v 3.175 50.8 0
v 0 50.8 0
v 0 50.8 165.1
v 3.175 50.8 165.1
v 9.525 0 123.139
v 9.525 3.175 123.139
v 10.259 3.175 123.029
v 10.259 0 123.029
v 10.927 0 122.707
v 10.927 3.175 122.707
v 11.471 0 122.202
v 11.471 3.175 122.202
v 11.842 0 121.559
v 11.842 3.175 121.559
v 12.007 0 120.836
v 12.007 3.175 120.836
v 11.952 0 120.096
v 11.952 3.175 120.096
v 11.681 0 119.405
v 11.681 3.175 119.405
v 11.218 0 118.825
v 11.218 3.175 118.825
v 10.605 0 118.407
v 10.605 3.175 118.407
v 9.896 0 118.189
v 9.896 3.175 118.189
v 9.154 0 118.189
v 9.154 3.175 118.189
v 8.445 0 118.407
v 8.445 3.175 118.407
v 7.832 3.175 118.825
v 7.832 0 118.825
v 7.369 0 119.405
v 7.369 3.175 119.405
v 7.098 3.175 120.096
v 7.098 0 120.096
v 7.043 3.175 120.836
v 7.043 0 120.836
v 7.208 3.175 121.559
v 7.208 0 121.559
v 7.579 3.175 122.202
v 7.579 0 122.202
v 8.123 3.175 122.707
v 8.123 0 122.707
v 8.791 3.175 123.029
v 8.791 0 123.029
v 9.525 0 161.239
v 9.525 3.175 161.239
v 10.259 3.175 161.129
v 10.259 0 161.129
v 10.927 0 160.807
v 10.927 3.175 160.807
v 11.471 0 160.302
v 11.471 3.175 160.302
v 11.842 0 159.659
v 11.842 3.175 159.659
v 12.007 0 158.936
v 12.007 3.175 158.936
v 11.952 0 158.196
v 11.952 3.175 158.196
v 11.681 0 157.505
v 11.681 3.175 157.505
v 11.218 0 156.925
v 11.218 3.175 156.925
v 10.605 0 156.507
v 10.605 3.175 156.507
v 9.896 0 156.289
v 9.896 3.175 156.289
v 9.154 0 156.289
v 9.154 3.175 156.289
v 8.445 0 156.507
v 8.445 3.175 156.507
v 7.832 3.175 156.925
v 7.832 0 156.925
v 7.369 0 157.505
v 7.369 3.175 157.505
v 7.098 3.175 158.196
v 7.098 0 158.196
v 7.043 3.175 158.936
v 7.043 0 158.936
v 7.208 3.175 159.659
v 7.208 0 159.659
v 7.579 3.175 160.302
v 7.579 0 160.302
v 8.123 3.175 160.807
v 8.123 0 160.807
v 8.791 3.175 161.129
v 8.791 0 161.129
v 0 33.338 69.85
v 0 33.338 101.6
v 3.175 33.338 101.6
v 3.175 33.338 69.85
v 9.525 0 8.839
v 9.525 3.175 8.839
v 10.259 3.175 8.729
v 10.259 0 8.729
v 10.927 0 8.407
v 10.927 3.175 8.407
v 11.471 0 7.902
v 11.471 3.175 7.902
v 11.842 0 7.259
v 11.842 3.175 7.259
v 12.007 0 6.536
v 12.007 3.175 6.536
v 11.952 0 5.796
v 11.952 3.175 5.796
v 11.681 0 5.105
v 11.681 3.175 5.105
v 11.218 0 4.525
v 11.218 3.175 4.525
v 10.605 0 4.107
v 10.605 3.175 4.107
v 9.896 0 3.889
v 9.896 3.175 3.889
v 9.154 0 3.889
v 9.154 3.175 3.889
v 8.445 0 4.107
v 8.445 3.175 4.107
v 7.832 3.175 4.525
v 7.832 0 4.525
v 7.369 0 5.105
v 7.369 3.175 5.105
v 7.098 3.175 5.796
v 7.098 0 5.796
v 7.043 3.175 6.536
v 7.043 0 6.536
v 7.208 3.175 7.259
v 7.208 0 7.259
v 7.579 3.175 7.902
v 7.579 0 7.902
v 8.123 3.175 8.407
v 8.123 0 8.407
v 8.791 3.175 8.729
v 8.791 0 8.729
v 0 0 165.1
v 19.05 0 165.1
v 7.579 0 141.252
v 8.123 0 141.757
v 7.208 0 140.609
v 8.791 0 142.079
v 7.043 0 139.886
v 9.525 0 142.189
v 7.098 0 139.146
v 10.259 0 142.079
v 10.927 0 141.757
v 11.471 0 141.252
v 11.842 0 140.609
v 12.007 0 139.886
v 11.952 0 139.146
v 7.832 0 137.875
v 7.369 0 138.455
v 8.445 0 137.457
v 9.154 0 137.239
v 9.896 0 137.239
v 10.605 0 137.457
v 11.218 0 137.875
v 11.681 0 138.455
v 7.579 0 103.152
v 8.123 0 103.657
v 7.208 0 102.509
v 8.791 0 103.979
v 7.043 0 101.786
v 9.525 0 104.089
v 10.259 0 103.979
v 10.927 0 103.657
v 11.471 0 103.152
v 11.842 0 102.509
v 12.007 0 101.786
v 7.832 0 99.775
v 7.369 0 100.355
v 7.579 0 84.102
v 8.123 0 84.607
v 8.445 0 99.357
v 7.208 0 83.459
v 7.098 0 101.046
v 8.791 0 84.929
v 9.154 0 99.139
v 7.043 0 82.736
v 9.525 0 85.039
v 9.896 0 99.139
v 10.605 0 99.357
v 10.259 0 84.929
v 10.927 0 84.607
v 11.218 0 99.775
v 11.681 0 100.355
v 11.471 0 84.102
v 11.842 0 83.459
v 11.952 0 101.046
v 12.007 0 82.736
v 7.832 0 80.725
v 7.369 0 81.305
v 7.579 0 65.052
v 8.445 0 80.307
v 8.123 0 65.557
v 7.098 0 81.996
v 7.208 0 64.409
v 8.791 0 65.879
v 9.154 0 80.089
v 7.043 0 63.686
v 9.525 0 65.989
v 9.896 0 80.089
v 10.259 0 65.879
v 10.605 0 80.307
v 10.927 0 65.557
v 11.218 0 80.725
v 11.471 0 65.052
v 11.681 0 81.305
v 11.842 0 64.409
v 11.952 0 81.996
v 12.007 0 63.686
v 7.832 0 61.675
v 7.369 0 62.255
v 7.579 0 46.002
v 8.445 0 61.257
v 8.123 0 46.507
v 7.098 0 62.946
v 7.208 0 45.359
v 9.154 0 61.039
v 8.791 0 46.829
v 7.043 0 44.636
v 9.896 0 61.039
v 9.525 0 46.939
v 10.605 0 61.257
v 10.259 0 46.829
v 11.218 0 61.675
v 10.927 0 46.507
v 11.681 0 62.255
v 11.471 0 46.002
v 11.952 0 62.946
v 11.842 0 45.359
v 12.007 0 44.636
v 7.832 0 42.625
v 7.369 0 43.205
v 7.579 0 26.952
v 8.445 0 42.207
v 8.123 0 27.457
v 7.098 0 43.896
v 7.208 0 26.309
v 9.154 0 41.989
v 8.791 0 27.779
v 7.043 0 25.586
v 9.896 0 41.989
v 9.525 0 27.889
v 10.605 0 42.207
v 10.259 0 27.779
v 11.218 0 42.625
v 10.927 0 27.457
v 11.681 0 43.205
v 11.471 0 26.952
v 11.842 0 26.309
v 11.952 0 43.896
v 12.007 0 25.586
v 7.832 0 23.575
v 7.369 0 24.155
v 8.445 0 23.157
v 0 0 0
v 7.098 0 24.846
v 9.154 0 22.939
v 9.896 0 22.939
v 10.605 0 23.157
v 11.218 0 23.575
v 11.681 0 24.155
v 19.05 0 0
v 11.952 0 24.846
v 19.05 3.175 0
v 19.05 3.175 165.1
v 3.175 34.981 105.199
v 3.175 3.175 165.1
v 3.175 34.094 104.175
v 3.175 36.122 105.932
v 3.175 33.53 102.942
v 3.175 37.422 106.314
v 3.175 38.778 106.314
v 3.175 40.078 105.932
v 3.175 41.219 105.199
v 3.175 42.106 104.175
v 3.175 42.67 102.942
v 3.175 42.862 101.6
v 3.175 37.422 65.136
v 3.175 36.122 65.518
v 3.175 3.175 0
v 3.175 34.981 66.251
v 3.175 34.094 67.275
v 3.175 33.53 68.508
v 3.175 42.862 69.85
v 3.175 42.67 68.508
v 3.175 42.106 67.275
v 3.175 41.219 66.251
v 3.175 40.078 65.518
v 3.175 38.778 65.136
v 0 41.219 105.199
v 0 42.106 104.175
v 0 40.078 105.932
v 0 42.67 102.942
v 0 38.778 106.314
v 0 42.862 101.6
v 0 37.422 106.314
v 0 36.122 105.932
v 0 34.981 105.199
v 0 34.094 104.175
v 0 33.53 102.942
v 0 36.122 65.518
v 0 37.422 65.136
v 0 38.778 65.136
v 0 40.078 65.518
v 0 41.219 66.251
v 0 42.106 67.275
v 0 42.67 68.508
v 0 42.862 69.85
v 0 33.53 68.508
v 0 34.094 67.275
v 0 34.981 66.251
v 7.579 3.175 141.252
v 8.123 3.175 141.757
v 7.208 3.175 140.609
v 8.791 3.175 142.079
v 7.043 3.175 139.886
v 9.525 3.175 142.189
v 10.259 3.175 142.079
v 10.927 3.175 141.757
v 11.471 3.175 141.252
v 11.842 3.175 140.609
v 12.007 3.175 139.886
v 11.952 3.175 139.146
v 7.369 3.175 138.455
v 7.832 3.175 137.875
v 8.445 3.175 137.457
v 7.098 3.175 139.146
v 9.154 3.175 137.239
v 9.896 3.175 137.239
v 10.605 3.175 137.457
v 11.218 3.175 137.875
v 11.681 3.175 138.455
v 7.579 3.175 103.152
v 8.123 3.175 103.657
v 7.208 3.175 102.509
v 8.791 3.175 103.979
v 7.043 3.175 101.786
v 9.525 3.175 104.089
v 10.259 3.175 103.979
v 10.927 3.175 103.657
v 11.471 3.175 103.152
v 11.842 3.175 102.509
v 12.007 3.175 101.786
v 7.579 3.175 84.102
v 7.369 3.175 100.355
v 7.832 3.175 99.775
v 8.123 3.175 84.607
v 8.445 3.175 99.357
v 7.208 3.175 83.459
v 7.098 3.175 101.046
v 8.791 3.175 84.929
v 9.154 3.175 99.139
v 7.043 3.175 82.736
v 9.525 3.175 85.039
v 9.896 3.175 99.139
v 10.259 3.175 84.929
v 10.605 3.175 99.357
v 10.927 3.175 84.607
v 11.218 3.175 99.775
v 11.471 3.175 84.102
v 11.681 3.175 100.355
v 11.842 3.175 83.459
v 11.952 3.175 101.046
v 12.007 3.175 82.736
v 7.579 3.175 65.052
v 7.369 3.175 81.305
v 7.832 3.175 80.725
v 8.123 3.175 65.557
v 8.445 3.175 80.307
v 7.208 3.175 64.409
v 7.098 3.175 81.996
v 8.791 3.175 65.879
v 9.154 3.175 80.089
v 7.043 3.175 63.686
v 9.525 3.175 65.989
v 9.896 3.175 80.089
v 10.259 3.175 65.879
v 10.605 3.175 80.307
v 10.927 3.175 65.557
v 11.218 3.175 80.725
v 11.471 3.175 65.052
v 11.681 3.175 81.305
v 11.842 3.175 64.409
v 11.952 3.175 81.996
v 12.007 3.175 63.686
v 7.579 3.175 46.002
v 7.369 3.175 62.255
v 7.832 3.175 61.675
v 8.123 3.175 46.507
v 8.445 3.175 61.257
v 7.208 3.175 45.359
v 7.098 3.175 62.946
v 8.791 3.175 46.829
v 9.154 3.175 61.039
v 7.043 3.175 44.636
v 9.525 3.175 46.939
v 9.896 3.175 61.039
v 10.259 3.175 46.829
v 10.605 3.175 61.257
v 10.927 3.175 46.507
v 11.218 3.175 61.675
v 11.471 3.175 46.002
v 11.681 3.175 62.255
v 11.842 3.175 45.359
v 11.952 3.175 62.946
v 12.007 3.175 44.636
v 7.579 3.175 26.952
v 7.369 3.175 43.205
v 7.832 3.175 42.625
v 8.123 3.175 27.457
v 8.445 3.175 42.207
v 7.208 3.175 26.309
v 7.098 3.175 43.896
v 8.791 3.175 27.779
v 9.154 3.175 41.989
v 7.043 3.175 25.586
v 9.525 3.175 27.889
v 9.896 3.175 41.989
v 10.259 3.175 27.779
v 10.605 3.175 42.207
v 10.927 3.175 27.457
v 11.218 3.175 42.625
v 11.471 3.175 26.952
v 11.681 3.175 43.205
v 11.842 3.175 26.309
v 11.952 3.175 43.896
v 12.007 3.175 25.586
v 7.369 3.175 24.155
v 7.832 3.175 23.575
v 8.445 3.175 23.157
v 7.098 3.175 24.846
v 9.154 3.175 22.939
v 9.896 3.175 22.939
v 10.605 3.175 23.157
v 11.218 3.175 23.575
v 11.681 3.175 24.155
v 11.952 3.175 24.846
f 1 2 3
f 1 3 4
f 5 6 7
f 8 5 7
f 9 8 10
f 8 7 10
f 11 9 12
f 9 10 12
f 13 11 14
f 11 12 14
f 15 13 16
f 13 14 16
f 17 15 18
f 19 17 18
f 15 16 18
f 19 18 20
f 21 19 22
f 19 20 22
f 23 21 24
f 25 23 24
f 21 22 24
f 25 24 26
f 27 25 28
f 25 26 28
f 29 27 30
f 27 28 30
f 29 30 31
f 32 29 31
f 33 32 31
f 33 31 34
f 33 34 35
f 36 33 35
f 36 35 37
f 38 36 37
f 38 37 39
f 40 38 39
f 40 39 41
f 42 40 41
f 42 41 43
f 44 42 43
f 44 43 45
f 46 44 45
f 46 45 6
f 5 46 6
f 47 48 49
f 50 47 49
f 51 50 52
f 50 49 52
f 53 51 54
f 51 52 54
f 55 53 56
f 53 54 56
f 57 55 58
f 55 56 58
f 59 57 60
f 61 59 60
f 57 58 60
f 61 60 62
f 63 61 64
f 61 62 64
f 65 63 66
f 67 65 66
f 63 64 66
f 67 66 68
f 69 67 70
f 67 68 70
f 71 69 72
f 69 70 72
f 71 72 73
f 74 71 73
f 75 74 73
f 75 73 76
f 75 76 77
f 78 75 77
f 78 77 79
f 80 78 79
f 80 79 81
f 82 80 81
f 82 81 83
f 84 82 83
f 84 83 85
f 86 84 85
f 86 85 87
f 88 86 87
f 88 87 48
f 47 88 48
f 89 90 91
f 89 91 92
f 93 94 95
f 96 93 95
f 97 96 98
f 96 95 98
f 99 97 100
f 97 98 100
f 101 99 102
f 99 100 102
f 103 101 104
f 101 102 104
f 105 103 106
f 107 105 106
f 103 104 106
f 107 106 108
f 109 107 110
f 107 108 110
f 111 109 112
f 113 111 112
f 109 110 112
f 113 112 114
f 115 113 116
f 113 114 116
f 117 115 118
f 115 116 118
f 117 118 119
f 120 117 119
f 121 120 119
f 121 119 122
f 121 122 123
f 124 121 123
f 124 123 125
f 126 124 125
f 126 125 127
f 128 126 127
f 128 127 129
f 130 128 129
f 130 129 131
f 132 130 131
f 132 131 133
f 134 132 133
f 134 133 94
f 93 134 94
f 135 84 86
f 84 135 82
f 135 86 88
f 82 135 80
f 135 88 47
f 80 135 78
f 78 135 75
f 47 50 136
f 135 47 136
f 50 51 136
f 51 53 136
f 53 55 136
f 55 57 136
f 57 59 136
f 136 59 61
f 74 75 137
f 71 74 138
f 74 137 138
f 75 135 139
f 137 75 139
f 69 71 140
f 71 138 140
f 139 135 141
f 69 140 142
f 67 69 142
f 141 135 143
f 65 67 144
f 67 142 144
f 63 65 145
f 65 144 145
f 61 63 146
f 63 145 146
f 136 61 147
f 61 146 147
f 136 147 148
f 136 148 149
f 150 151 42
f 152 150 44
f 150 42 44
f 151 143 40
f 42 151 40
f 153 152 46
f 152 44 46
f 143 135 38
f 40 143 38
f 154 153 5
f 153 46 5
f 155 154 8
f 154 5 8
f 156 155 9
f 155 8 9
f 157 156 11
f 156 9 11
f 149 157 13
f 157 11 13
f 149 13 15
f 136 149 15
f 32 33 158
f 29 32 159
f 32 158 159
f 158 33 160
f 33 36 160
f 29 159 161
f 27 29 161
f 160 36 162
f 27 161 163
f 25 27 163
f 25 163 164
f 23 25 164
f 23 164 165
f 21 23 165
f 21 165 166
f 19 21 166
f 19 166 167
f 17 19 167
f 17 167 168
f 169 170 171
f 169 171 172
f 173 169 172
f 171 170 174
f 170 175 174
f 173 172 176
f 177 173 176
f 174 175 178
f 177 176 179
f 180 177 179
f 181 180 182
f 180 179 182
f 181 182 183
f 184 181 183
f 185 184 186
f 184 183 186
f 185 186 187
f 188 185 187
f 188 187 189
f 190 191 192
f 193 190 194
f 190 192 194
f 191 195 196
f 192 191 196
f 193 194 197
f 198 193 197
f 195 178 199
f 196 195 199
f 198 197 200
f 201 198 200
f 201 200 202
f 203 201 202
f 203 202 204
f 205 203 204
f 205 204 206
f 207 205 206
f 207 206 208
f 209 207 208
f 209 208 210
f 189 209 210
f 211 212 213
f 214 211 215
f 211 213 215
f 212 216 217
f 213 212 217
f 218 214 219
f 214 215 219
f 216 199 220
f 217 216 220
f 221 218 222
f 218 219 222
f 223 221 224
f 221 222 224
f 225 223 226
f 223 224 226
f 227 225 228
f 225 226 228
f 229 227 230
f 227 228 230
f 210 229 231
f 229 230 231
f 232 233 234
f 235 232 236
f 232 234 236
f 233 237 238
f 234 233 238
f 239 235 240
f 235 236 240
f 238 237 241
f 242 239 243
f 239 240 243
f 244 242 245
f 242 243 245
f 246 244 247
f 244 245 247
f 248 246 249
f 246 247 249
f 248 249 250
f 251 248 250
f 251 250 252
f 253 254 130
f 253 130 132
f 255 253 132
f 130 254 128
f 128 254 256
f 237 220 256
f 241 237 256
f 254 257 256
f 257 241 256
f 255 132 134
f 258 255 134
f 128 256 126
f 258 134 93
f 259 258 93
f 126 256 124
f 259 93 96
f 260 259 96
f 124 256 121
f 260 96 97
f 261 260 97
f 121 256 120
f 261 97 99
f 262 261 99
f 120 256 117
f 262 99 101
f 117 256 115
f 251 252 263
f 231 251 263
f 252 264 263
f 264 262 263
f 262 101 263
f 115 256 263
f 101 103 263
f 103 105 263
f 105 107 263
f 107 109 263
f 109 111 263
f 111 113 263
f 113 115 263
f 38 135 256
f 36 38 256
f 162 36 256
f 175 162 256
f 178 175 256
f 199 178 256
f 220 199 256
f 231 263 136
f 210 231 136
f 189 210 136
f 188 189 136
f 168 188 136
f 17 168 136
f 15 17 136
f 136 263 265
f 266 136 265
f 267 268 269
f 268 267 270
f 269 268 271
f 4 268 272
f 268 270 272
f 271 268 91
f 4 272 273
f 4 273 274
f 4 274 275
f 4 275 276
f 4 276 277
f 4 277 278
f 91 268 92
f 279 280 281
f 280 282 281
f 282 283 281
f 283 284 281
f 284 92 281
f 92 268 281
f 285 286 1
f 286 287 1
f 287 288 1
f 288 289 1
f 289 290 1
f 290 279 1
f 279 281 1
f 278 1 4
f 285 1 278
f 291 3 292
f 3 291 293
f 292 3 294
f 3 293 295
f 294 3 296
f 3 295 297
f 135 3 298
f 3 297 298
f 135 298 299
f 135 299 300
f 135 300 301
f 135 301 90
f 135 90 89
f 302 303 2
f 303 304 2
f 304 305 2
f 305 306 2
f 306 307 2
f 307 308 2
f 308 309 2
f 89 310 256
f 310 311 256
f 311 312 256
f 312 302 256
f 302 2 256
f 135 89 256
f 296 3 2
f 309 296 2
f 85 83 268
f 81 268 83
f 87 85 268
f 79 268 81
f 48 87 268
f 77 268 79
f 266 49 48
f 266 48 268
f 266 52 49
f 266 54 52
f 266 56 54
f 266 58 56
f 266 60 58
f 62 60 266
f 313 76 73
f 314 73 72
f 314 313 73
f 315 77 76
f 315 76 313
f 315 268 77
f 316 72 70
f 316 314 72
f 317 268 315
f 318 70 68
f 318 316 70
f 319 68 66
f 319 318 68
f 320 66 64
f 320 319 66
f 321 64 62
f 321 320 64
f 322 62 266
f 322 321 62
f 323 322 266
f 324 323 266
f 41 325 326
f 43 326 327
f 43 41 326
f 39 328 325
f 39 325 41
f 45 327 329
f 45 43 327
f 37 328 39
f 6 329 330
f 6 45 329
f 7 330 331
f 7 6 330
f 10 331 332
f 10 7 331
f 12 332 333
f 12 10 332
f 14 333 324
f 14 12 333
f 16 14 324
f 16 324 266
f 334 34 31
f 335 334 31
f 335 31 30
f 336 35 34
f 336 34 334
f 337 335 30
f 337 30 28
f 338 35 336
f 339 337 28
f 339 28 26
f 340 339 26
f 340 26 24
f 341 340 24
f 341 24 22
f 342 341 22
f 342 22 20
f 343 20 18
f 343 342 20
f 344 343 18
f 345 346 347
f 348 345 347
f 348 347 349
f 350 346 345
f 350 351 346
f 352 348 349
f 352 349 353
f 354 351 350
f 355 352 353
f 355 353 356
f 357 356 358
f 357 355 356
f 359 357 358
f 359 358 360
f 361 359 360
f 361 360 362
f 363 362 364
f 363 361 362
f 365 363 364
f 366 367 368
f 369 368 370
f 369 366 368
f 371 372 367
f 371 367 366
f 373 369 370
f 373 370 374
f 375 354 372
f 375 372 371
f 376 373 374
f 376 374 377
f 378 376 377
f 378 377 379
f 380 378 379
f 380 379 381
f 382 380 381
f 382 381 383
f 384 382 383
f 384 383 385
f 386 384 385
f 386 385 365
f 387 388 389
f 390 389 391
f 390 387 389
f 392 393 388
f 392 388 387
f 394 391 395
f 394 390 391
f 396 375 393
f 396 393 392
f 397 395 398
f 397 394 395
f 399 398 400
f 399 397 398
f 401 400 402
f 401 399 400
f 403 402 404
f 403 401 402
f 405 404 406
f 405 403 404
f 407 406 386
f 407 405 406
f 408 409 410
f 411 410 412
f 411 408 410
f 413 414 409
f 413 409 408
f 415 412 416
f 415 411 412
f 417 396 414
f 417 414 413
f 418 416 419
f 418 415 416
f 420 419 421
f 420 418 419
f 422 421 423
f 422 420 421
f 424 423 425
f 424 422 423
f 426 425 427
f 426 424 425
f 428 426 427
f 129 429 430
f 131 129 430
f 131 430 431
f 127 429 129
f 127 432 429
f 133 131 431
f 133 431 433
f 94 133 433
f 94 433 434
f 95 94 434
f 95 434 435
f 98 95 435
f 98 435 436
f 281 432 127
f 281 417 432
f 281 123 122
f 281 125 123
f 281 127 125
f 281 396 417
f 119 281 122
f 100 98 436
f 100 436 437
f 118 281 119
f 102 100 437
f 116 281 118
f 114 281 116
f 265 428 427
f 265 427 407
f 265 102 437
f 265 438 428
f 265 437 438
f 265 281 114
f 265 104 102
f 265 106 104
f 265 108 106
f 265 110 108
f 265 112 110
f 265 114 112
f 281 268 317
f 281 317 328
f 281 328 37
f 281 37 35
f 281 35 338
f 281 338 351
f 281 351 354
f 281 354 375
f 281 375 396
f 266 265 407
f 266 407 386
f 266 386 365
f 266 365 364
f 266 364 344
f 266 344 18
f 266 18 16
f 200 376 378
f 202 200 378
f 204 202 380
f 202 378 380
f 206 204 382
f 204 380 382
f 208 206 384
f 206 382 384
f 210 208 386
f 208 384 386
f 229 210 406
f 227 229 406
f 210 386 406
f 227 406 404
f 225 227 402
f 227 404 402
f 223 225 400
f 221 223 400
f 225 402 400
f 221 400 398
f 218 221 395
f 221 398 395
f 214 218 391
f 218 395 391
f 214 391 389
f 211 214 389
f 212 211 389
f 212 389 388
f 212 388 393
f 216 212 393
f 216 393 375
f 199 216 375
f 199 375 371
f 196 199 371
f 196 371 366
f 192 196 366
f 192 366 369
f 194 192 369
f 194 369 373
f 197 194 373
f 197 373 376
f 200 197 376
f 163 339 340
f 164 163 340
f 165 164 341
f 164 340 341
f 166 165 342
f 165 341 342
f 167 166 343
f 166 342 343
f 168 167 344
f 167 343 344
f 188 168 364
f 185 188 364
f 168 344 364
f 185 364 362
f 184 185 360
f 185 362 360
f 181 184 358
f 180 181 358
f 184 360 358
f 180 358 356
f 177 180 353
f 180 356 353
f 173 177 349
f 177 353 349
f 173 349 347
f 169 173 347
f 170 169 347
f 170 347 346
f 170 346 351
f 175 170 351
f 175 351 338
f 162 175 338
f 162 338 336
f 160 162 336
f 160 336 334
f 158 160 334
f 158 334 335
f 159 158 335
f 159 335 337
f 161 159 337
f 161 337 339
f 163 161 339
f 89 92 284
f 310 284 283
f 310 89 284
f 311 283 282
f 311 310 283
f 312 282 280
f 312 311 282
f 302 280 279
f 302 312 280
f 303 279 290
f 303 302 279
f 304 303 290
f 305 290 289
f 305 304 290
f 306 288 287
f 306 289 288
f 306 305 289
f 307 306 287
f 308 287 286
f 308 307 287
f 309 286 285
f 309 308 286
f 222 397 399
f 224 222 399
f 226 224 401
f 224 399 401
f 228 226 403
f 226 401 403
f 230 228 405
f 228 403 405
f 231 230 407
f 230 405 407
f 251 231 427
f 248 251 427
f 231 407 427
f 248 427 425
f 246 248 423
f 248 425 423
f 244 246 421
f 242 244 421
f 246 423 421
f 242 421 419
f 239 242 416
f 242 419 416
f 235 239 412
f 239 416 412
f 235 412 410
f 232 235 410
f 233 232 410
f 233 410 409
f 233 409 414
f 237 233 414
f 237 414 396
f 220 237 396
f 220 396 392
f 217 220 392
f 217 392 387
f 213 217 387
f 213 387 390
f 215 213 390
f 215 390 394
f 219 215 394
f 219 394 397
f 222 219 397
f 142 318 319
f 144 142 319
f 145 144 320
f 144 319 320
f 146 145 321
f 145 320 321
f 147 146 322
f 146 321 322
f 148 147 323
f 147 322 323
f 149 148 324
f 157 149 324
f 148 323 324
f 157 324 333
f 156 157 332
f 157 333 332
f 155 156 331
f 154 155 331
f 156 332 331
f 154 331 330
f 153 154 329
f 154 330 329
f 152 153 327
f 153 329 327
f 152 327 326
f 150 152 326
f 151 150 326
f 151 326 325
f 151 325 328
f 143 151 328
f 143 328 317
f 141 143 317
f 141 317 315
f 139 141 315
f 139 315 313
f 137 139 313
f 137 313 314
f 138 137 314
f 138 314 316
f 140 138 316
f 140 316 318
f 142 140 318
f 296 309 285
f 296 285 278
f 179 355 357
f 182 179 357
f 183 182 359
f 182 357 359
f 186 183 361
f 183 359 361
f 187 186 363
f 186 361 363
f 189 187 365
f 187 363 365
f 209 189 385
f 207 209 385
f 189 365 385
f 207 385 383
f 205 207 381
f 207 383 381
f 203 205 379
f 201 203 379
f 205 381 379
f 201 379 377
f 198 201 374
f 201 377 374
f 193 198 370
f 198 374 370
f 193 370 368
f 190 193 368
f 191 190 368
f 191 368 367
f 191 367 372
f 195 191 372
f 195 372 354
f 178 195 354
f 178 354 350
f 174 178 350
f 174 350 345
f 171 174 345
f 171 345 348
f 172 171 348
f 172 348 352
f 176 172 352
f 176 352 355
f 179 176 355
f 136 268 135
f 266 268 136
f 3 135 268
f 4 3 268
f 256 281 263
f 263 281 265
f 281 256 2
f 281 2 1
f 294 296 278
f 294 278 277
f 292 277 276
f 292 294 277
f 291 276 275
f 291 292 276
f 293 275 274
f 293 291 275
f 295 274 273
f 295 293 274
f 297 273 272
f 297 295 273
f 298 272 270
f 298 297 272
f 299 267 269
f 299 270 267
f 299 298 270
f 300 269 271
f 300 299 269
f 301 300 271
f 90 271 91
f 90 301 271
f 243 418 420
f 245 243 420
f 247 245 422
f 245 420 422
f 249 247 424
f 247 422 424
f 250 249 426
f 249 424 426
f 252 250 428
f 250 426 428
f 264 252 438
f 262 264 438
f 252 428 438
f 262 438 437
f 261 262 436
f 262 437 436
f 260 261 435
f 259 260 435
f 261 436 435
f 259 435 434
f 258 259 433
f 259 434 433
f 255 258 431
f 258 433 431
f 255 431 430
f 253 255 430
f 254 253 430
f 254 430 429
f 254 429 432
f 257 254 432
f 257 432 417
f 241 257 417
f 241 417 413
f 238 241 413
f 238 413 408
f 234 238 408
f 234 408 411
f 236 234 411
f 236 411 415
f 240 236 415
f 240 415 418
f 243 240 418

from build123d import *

# Parameters (mm, degrees)
SKETCH3_W           = 3.175
SKETCH3_H           = 47.625
SKETCH3_H_2         = 3.175
SKETCH3_W_2         = 15.875
BOSS_EXTRUDE1_DEPTH = 165.1
SKETCH4_R           = 2.4892
CUT_EXTRUDE1_DEPTH  = 165.1
CUT_EXTRUDE2_DEPTH  = 165.1


with BuildPart() as part:
    # Sketch3 → Boss-Extrude1 (new body)
    with BuildSketch(Plane.XY):
        with Locations((1.5875, 26.9875)):
            Rectangle(SKETCH3_W, SKETCH3_H)
        with Locations((1.5875, 1.5875)):
            Rectangle(SKETCH3_W, SKETCH3_H_2)
        with Locations((11.1125, 1.5875)):
            Rectangle(SKETCH3_W_2, SKETCH3_H_2)
    extrude(amount=BOSS_EXTRUDE1_DEPTH)

    # Sketch4 → Cut-Extrude1 (cut)
    with BuildSketch(Plane(origin=(0, 3.175, 0), x_dir=(1, 0, 0), z_dir=(0, 1, 0))):
        with Locations(Location((9.525, -6.35, 0), (0, 0, 270))):
            Circle(SKETCH4_R)
        with Locations(Location((9.525, -25.4, 0), (0, 0, 270))):
            Circle(SKETCH4_R)
        with Locations(Location((9.525, -44.45, 0), (0, 0, 270))):
            Circle(SKETCH4_R)
        with Locations(Location((9.525, -63.5, 0), (0, 0, 270))):
            Circle(SKETCH4_R)
        with Locations(Location((9.525, -82.55, 0), (0, 0, 270))):
            Circle(SKETCH4_R)
        with Locations(Location((9.525, -101.6, 0), (0, 0, 270))):
            Circle(SKETCH4_R)
        with Locations(Location((9.525, -120.65, 0), (0, 0, 270))):
            Circle(SKETCH4_R)
        with Locations(Location((9.525, -139.7, 0), (0, 0, 270))):
            Circle(SKETCH4_R)
        with Locations(Location((9.525, -158.75, 0), (0, 0, 270))):
            Circle(SKETCH4_R)
    extrude(amount=-CUT_EXTRUDE1_DEPTH, mode=Mode.SUBTRACT)

    # Sketch5 → Cut-Extrude2 (cut)
    with BuildSketch(Plane.ZY):
        with BuildLine():
            Line((69.85, 42.8625), (101.6, 42.8625))
            ThreePointArc((101.6, 42.8625), (106.3625, 38.1), (101.6, 33.3375))
            Line((101.6, 33.3375), (69.85, 33.3375))
            ThreePointArc((69.85, 33.3375), (65.0875, 38.1), (69.85, 42.8625))
        make_face()
    extrude(amount=-CUT_EXTRUDE2_DEPTH, mode=Mode.SUBTRACT)


solid = part.part
